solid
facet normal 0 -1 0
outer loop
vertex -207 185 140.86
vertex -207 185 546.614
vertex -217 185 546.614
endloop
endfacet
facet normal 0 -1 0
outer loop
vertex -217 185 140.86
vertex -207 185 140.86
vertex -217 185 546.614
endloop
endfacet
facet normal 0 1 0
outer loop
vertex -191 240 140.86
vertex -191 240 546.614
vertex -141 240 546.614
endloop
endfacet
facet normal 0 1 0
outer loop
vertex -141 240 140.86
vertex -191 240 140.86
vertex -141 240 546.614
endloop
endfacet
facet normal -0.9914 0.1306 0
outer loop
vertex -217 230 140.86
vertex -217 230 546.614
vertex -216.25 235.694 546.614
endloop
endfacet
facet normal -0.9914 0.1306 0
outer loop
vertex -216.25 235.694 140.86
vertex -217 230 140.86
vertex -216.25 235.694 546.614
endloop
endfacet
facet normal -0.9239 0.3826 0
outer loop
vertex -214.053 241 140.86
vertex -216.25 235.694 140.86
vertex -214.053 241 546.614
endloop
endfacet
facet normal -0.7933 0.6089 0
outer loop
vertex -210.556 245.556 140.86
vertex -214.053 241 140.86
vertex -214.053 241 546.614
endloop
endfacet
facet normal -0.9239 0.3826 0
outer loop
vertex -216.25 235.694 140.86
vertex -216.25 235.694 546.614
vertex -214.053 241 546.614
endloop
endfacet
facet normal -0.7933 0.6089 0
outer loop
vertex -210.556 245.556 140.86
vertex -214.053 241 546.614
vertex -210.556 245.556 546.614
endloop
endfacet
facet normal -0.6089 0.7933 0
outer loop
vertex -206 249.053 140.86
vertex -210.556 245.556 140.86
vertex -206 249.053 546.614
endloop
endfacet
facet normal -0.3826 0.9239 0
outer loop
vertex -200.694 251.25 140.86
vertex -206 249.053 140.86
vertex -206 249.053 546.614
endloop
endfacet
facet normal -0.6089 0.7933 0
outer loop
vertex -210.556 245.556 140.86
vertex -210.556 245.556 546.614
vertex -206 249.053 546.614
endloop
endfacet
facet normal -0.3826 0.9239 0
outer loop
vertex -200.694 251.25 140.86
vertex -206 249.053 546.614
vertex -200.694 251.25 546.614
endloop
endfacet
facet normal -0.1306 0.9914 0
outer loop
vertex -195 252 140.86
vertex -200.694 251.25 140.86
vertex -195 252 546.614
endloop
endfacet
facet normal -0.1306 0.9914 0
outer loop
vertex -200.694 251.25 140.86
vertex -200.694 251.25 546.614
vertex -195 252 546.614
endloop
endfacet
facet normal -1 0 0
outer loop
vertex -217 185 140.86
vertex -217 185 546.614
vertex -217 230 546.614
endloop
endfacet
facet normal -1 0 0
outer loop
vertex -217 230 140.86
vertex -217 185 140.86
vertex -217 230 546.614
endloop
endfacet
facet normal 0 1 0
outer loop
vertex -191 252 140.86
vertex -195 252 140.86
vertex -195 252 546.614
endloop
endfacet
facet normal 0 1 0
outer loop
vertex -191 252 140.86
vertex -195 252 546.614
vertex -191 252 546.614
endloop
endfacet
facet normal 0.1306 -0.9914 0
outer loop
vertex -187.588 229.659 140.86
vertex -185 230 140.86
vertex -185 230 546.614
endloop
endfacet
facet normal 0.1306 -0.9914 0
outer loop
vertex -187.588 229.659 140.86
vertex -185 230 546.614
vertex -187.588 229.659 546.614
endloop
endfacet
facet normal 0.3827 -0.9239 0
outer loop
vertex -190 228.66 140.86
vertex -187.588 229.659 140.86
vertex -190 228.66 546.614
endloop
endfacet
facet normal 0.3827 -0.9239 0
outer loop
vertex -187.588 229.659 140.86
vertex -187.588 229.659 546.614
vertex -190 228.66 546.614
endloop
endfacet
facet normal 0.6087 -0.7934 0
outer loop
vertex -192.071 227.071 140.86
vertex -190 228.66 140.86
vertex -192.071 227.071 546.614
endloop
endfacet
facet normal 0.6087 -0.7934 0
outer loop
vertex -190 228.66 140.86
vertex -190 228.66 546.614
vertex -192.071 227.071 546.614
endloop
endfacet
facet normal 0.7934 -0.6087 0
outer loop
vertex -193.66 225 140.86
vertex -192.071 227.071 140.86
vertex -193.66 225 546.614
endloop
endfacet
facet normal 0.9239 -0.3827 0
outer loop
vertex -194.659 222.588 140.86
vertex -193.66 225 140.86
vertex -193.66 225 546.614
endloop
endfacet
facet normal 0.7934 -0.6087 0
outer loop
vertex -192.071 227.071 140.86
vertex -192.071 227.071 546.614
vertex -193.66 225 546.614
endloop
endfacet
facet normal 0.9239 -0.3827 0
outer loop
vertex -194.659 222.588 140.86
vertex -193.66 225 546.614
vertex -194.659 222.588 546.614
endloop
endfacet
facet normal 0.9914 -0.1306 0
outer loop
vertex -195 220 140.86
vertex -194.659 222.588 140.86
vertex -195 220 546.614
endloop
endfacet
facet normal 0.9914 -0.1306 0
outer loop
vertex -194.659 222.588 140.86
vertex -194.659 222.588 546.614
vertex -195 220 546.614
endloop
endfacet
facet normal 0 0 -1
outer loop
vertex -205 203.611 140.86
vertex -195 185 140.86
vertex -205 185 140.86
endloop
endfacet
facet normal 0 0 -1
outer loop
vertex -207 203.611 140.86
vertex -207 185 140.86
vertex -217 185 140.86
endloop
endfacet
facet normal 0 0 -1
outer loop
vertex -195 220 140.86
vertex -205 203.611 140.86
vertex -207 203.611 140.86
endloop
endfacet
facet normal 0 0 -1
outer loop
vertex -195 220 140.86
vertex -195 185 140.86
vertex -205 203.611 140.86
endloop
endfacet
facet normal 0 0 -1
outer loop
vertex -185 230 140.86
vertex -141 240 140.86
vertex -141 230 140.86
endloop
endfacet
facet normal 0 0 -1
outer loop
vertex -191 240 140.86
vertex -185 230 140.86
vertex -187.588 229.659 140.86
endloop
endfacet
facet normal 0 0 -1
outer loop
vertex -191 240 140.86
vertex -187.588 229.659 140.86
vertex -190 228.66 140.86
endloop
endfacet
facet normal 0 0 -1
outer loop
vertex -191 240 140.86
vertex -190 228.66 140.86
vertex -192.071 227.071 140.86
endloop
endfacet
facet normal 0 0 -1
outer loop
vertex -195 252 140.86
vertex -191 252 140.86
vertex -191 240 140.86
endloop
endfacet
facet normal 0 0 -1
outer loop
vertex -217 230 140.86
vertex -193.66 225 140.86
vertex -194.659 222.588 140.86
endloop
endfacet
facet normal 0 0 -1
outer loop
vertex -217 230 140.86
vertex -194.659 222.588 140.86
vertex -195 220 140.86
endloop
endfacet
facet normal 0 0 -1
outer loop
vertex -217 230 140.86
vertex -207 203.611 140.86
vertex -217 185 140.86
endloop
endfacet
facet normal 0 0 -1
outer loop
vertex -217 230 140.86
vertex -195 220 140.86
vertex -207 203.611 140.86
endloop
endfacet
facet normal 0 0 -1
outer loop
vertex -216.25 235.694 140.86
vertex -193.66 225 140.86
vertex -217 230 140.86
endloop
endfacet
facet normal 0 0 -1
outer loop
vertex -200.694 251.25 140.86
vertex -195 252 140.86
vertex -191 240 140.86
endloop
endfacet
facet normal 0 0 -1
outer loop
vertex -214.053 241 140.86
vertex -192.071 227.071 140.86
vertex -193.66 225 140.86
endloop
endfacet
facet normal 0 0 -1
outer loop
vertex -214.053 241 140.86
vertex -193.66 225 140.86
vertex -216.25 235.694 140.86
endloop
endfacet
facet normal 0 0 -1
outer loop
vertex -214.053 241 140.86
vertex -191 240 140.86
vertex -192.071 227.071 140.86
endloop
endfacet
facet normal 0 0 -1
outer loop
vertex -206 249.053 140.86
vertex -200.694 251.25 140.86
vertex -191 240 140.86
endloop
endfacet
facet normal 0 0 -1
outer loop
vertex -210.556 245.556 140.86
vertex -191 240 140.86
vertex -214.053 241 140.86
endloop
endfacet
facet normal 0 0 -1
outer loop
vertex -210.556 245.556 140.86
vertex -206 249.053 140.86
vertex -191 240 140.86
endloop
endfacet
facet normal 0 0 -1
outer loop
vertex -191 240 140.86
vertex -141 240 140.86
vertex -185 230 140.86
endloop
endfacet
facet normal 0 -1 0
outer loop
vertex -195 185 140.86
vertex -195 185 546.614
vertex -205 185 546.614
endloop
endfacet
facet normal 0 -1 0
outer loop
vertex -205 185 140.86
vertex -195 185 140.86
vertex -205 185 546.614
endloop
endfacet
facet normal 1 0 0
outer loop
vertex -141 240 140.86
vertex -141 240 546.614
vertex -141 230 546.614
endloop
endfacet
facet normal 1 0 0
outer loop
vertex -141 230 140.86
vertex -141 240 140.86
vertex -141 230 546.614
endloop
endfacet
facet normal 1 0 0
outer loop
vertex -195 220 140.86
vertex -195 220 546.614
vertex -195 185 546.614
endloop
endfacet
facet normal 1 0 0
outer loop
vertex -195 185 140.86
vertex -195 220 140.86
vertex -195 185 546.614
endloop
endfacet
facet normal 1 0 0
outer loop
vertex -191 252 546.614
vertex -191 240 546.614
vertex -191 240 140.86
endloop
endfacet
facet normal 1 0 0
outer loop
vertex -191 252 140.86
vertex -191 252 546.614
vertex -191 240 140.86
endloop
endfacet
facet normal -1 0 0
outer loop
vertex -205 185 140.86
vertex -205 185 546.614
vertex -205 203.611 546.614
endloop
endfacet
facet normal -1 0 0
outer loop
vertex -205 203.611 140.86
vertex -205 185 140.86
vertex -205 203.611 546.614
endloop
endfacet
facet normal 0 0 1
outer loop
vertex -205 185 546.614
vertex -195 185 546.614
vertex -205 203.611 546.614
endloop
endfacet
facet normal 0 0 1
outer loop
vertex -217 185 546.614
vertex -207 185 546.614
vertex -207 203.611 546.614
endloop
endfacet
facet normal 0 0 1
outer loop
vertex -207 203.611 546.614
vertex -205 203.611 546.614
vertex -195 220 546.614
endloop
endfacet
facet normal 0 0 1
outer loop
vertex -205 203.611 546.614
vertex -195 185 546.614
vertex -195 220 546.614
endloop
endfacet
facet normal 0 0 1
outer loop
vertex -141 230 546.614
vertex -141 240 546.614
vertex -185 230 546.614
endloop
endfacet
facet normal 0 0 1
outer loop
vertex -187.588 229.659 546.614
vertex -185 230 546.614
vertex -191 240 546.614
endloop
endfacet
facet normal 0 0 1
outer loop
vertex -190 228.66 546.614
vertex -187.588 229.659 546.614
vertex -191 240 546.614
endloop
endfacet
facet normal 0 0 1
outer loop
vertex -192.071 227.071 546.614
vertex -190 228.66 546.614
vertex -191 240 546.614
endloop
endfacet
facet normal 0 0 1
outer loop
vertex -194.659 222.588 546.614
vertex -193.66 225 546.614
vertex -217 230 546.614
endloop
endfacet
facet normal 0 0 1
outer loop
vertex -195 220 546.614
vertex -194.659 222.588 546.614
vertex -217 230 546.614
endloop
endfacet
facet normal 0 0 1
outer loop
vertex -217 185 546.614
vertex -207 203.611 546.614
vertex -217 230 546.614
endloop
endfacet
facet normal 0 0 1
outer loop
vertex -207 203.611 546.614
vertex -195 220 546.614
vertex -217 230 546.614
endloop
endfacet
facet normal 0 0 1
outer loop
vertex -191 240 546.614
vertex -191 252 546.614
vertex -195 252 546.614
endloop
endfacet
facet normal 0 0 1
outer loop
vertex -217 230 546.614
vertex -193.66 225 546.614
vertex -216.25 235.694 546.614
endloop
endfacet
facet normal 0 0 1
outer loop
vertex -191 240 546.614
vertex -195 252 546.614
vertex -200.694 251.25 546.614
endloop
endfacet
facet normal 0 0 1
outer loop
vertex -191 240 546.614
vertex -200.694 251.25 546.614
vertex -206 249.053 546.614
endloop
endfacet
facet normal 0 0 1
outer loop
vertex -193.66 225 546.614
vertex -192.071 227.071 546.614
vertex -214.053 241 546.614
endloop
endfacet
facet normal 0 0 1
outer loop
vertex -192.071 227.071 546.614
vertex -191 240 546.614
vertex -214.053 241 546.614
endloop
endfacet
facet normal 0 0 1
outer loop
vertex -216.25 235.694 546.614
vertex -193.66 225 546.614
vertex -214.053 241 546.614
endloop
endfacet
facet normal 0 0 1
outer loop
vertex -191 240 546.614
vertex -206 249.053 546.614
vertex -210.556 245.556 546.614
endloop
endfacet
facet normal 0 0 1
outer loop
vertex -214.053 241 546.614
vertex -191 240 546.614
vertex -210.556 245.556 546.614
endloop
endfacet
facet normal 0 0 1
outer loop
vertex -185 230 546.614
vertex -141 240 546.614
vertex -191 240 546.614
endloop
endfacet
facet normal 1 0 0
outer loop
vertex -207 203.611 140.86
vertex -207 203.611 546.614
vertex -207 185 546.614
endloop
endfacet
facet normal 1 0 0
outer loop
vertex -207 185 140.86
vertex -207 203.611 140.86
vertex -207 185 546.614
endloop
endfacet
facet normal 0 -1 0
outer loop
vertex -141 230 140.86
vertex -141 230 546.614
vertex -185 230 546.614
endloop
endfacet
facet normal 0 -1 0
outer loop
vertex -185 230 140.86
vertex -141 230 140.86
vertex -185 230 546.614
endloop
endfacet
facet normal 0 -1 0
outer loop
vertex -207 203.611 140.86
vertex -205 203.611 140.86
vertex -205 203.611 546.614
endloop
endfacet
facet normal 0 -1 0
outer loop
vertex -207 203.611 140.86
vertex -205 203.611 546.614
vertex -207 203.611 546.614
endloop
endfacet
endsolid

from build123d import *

# Parameters (mm, degrees)
BOSS_EXTRUDE1_DEPTH = 405.754616144
SKETCH2_W           = 405.754616144
SKETCH2_H           = 10
CUT_EXTRUDE1_DEPTH  = 11.5
CAVITY1_START       = 240
CAVITY1_OUTLINE_W   = 38.5
CAVITY1_OUTLINE_H   = 405.754616144
CAVITY1_DEPTH       = 2
SKETCH3_W           = 405.754616144
SKETCH3_H           = 10
CUT_EXTRUDE2_DEPTH  = 38.5


# Read off the part's stored shape, not the designer's step: Cavity1
with BuildPart() as part:
    # Sketch1 → Boss-Extrude1 (new body)
    with BuildSketch(Plane(origin=(0, 0, 546.614427926), x_dir=(-1, 0, 0), z_dir=(0, 0, -1))):
        with BuildLine():
            Line((141, 242), (152.5, 242))
            Line((152.5, 242), (152.5, 240))
            Line((152.5, 240), (141, 240))
            Line((141, 240), (141, 230))
            Line((141, 230), (185, 230))
            ThreePointArc((185, 230), (192.071067812, 227.071067812), (195, 220))
            Line((195, 220), (195, 185))
            Line((195, 185), (205, 185))
            Line((205, 185), (205, 203.610753203))
            Line((205, 203.610753203), (207, 203.610753203))
            Line((207, 203.610753203), (207, 185))
            Line((207, 185), (217, 185))
            Line((217, 185), (217, 230))
            ThreePointArc((217, 230), (210.556349186, 245.556349186), (195, 252))
            Line((195, 252), (141, 252))
            Line((141, 252), (141, 242))
        make_face()
    extrude(amount=BOSS_EXTRUDE1_DEPTH)

    # Sketch2 → Cut-Extrude1 (cut)
    with BuildSketch(Plane(origin=(-141, 0, 0), x_dir=(0, 0, -1), z_dir=(1, 0, 0))):
        with Locations((-343.737119854, 247)):
            Rectangle(SKETCH2_W, SKETCH2_H)
    extrude(amount=-CUT_EXTRUDE1_DEPTH, mode=Mode.SUBTRACT)

    # Cavity1 outline → Cavity1 (cut)
    with BuildSketch(Plane(origin=(0, 0, 0), x_dir=(1, 0, 0), z_dir=(0, 1, 0)).offset(CAVITY1_START)):
        with Locations((-171.75, -343.737119854)):
            Rectangle(CAVITY1_OUTLINE_W, CAVITY1_OUTLINE_H)
    extrude(amount=CAVITY1_DEPTH, mode=Mode.SUBTRACT)

    # Sketch3 → Cut-Extrude2 (cut)
    with BuildSketch(Plane(origin=(-152.5, 0, 0), x_dir=(0, 0, -1), z_dir=(1, 0, 0))):
        with Locations((-343.737119854, 247)):
            Rectangle(SKETCH3_W, SKETCH3_H)
    extrude(amount=-CUT_EXTRUDE2_DEPTH, mode=Mode.SUBTRACT)


solid = part.part
